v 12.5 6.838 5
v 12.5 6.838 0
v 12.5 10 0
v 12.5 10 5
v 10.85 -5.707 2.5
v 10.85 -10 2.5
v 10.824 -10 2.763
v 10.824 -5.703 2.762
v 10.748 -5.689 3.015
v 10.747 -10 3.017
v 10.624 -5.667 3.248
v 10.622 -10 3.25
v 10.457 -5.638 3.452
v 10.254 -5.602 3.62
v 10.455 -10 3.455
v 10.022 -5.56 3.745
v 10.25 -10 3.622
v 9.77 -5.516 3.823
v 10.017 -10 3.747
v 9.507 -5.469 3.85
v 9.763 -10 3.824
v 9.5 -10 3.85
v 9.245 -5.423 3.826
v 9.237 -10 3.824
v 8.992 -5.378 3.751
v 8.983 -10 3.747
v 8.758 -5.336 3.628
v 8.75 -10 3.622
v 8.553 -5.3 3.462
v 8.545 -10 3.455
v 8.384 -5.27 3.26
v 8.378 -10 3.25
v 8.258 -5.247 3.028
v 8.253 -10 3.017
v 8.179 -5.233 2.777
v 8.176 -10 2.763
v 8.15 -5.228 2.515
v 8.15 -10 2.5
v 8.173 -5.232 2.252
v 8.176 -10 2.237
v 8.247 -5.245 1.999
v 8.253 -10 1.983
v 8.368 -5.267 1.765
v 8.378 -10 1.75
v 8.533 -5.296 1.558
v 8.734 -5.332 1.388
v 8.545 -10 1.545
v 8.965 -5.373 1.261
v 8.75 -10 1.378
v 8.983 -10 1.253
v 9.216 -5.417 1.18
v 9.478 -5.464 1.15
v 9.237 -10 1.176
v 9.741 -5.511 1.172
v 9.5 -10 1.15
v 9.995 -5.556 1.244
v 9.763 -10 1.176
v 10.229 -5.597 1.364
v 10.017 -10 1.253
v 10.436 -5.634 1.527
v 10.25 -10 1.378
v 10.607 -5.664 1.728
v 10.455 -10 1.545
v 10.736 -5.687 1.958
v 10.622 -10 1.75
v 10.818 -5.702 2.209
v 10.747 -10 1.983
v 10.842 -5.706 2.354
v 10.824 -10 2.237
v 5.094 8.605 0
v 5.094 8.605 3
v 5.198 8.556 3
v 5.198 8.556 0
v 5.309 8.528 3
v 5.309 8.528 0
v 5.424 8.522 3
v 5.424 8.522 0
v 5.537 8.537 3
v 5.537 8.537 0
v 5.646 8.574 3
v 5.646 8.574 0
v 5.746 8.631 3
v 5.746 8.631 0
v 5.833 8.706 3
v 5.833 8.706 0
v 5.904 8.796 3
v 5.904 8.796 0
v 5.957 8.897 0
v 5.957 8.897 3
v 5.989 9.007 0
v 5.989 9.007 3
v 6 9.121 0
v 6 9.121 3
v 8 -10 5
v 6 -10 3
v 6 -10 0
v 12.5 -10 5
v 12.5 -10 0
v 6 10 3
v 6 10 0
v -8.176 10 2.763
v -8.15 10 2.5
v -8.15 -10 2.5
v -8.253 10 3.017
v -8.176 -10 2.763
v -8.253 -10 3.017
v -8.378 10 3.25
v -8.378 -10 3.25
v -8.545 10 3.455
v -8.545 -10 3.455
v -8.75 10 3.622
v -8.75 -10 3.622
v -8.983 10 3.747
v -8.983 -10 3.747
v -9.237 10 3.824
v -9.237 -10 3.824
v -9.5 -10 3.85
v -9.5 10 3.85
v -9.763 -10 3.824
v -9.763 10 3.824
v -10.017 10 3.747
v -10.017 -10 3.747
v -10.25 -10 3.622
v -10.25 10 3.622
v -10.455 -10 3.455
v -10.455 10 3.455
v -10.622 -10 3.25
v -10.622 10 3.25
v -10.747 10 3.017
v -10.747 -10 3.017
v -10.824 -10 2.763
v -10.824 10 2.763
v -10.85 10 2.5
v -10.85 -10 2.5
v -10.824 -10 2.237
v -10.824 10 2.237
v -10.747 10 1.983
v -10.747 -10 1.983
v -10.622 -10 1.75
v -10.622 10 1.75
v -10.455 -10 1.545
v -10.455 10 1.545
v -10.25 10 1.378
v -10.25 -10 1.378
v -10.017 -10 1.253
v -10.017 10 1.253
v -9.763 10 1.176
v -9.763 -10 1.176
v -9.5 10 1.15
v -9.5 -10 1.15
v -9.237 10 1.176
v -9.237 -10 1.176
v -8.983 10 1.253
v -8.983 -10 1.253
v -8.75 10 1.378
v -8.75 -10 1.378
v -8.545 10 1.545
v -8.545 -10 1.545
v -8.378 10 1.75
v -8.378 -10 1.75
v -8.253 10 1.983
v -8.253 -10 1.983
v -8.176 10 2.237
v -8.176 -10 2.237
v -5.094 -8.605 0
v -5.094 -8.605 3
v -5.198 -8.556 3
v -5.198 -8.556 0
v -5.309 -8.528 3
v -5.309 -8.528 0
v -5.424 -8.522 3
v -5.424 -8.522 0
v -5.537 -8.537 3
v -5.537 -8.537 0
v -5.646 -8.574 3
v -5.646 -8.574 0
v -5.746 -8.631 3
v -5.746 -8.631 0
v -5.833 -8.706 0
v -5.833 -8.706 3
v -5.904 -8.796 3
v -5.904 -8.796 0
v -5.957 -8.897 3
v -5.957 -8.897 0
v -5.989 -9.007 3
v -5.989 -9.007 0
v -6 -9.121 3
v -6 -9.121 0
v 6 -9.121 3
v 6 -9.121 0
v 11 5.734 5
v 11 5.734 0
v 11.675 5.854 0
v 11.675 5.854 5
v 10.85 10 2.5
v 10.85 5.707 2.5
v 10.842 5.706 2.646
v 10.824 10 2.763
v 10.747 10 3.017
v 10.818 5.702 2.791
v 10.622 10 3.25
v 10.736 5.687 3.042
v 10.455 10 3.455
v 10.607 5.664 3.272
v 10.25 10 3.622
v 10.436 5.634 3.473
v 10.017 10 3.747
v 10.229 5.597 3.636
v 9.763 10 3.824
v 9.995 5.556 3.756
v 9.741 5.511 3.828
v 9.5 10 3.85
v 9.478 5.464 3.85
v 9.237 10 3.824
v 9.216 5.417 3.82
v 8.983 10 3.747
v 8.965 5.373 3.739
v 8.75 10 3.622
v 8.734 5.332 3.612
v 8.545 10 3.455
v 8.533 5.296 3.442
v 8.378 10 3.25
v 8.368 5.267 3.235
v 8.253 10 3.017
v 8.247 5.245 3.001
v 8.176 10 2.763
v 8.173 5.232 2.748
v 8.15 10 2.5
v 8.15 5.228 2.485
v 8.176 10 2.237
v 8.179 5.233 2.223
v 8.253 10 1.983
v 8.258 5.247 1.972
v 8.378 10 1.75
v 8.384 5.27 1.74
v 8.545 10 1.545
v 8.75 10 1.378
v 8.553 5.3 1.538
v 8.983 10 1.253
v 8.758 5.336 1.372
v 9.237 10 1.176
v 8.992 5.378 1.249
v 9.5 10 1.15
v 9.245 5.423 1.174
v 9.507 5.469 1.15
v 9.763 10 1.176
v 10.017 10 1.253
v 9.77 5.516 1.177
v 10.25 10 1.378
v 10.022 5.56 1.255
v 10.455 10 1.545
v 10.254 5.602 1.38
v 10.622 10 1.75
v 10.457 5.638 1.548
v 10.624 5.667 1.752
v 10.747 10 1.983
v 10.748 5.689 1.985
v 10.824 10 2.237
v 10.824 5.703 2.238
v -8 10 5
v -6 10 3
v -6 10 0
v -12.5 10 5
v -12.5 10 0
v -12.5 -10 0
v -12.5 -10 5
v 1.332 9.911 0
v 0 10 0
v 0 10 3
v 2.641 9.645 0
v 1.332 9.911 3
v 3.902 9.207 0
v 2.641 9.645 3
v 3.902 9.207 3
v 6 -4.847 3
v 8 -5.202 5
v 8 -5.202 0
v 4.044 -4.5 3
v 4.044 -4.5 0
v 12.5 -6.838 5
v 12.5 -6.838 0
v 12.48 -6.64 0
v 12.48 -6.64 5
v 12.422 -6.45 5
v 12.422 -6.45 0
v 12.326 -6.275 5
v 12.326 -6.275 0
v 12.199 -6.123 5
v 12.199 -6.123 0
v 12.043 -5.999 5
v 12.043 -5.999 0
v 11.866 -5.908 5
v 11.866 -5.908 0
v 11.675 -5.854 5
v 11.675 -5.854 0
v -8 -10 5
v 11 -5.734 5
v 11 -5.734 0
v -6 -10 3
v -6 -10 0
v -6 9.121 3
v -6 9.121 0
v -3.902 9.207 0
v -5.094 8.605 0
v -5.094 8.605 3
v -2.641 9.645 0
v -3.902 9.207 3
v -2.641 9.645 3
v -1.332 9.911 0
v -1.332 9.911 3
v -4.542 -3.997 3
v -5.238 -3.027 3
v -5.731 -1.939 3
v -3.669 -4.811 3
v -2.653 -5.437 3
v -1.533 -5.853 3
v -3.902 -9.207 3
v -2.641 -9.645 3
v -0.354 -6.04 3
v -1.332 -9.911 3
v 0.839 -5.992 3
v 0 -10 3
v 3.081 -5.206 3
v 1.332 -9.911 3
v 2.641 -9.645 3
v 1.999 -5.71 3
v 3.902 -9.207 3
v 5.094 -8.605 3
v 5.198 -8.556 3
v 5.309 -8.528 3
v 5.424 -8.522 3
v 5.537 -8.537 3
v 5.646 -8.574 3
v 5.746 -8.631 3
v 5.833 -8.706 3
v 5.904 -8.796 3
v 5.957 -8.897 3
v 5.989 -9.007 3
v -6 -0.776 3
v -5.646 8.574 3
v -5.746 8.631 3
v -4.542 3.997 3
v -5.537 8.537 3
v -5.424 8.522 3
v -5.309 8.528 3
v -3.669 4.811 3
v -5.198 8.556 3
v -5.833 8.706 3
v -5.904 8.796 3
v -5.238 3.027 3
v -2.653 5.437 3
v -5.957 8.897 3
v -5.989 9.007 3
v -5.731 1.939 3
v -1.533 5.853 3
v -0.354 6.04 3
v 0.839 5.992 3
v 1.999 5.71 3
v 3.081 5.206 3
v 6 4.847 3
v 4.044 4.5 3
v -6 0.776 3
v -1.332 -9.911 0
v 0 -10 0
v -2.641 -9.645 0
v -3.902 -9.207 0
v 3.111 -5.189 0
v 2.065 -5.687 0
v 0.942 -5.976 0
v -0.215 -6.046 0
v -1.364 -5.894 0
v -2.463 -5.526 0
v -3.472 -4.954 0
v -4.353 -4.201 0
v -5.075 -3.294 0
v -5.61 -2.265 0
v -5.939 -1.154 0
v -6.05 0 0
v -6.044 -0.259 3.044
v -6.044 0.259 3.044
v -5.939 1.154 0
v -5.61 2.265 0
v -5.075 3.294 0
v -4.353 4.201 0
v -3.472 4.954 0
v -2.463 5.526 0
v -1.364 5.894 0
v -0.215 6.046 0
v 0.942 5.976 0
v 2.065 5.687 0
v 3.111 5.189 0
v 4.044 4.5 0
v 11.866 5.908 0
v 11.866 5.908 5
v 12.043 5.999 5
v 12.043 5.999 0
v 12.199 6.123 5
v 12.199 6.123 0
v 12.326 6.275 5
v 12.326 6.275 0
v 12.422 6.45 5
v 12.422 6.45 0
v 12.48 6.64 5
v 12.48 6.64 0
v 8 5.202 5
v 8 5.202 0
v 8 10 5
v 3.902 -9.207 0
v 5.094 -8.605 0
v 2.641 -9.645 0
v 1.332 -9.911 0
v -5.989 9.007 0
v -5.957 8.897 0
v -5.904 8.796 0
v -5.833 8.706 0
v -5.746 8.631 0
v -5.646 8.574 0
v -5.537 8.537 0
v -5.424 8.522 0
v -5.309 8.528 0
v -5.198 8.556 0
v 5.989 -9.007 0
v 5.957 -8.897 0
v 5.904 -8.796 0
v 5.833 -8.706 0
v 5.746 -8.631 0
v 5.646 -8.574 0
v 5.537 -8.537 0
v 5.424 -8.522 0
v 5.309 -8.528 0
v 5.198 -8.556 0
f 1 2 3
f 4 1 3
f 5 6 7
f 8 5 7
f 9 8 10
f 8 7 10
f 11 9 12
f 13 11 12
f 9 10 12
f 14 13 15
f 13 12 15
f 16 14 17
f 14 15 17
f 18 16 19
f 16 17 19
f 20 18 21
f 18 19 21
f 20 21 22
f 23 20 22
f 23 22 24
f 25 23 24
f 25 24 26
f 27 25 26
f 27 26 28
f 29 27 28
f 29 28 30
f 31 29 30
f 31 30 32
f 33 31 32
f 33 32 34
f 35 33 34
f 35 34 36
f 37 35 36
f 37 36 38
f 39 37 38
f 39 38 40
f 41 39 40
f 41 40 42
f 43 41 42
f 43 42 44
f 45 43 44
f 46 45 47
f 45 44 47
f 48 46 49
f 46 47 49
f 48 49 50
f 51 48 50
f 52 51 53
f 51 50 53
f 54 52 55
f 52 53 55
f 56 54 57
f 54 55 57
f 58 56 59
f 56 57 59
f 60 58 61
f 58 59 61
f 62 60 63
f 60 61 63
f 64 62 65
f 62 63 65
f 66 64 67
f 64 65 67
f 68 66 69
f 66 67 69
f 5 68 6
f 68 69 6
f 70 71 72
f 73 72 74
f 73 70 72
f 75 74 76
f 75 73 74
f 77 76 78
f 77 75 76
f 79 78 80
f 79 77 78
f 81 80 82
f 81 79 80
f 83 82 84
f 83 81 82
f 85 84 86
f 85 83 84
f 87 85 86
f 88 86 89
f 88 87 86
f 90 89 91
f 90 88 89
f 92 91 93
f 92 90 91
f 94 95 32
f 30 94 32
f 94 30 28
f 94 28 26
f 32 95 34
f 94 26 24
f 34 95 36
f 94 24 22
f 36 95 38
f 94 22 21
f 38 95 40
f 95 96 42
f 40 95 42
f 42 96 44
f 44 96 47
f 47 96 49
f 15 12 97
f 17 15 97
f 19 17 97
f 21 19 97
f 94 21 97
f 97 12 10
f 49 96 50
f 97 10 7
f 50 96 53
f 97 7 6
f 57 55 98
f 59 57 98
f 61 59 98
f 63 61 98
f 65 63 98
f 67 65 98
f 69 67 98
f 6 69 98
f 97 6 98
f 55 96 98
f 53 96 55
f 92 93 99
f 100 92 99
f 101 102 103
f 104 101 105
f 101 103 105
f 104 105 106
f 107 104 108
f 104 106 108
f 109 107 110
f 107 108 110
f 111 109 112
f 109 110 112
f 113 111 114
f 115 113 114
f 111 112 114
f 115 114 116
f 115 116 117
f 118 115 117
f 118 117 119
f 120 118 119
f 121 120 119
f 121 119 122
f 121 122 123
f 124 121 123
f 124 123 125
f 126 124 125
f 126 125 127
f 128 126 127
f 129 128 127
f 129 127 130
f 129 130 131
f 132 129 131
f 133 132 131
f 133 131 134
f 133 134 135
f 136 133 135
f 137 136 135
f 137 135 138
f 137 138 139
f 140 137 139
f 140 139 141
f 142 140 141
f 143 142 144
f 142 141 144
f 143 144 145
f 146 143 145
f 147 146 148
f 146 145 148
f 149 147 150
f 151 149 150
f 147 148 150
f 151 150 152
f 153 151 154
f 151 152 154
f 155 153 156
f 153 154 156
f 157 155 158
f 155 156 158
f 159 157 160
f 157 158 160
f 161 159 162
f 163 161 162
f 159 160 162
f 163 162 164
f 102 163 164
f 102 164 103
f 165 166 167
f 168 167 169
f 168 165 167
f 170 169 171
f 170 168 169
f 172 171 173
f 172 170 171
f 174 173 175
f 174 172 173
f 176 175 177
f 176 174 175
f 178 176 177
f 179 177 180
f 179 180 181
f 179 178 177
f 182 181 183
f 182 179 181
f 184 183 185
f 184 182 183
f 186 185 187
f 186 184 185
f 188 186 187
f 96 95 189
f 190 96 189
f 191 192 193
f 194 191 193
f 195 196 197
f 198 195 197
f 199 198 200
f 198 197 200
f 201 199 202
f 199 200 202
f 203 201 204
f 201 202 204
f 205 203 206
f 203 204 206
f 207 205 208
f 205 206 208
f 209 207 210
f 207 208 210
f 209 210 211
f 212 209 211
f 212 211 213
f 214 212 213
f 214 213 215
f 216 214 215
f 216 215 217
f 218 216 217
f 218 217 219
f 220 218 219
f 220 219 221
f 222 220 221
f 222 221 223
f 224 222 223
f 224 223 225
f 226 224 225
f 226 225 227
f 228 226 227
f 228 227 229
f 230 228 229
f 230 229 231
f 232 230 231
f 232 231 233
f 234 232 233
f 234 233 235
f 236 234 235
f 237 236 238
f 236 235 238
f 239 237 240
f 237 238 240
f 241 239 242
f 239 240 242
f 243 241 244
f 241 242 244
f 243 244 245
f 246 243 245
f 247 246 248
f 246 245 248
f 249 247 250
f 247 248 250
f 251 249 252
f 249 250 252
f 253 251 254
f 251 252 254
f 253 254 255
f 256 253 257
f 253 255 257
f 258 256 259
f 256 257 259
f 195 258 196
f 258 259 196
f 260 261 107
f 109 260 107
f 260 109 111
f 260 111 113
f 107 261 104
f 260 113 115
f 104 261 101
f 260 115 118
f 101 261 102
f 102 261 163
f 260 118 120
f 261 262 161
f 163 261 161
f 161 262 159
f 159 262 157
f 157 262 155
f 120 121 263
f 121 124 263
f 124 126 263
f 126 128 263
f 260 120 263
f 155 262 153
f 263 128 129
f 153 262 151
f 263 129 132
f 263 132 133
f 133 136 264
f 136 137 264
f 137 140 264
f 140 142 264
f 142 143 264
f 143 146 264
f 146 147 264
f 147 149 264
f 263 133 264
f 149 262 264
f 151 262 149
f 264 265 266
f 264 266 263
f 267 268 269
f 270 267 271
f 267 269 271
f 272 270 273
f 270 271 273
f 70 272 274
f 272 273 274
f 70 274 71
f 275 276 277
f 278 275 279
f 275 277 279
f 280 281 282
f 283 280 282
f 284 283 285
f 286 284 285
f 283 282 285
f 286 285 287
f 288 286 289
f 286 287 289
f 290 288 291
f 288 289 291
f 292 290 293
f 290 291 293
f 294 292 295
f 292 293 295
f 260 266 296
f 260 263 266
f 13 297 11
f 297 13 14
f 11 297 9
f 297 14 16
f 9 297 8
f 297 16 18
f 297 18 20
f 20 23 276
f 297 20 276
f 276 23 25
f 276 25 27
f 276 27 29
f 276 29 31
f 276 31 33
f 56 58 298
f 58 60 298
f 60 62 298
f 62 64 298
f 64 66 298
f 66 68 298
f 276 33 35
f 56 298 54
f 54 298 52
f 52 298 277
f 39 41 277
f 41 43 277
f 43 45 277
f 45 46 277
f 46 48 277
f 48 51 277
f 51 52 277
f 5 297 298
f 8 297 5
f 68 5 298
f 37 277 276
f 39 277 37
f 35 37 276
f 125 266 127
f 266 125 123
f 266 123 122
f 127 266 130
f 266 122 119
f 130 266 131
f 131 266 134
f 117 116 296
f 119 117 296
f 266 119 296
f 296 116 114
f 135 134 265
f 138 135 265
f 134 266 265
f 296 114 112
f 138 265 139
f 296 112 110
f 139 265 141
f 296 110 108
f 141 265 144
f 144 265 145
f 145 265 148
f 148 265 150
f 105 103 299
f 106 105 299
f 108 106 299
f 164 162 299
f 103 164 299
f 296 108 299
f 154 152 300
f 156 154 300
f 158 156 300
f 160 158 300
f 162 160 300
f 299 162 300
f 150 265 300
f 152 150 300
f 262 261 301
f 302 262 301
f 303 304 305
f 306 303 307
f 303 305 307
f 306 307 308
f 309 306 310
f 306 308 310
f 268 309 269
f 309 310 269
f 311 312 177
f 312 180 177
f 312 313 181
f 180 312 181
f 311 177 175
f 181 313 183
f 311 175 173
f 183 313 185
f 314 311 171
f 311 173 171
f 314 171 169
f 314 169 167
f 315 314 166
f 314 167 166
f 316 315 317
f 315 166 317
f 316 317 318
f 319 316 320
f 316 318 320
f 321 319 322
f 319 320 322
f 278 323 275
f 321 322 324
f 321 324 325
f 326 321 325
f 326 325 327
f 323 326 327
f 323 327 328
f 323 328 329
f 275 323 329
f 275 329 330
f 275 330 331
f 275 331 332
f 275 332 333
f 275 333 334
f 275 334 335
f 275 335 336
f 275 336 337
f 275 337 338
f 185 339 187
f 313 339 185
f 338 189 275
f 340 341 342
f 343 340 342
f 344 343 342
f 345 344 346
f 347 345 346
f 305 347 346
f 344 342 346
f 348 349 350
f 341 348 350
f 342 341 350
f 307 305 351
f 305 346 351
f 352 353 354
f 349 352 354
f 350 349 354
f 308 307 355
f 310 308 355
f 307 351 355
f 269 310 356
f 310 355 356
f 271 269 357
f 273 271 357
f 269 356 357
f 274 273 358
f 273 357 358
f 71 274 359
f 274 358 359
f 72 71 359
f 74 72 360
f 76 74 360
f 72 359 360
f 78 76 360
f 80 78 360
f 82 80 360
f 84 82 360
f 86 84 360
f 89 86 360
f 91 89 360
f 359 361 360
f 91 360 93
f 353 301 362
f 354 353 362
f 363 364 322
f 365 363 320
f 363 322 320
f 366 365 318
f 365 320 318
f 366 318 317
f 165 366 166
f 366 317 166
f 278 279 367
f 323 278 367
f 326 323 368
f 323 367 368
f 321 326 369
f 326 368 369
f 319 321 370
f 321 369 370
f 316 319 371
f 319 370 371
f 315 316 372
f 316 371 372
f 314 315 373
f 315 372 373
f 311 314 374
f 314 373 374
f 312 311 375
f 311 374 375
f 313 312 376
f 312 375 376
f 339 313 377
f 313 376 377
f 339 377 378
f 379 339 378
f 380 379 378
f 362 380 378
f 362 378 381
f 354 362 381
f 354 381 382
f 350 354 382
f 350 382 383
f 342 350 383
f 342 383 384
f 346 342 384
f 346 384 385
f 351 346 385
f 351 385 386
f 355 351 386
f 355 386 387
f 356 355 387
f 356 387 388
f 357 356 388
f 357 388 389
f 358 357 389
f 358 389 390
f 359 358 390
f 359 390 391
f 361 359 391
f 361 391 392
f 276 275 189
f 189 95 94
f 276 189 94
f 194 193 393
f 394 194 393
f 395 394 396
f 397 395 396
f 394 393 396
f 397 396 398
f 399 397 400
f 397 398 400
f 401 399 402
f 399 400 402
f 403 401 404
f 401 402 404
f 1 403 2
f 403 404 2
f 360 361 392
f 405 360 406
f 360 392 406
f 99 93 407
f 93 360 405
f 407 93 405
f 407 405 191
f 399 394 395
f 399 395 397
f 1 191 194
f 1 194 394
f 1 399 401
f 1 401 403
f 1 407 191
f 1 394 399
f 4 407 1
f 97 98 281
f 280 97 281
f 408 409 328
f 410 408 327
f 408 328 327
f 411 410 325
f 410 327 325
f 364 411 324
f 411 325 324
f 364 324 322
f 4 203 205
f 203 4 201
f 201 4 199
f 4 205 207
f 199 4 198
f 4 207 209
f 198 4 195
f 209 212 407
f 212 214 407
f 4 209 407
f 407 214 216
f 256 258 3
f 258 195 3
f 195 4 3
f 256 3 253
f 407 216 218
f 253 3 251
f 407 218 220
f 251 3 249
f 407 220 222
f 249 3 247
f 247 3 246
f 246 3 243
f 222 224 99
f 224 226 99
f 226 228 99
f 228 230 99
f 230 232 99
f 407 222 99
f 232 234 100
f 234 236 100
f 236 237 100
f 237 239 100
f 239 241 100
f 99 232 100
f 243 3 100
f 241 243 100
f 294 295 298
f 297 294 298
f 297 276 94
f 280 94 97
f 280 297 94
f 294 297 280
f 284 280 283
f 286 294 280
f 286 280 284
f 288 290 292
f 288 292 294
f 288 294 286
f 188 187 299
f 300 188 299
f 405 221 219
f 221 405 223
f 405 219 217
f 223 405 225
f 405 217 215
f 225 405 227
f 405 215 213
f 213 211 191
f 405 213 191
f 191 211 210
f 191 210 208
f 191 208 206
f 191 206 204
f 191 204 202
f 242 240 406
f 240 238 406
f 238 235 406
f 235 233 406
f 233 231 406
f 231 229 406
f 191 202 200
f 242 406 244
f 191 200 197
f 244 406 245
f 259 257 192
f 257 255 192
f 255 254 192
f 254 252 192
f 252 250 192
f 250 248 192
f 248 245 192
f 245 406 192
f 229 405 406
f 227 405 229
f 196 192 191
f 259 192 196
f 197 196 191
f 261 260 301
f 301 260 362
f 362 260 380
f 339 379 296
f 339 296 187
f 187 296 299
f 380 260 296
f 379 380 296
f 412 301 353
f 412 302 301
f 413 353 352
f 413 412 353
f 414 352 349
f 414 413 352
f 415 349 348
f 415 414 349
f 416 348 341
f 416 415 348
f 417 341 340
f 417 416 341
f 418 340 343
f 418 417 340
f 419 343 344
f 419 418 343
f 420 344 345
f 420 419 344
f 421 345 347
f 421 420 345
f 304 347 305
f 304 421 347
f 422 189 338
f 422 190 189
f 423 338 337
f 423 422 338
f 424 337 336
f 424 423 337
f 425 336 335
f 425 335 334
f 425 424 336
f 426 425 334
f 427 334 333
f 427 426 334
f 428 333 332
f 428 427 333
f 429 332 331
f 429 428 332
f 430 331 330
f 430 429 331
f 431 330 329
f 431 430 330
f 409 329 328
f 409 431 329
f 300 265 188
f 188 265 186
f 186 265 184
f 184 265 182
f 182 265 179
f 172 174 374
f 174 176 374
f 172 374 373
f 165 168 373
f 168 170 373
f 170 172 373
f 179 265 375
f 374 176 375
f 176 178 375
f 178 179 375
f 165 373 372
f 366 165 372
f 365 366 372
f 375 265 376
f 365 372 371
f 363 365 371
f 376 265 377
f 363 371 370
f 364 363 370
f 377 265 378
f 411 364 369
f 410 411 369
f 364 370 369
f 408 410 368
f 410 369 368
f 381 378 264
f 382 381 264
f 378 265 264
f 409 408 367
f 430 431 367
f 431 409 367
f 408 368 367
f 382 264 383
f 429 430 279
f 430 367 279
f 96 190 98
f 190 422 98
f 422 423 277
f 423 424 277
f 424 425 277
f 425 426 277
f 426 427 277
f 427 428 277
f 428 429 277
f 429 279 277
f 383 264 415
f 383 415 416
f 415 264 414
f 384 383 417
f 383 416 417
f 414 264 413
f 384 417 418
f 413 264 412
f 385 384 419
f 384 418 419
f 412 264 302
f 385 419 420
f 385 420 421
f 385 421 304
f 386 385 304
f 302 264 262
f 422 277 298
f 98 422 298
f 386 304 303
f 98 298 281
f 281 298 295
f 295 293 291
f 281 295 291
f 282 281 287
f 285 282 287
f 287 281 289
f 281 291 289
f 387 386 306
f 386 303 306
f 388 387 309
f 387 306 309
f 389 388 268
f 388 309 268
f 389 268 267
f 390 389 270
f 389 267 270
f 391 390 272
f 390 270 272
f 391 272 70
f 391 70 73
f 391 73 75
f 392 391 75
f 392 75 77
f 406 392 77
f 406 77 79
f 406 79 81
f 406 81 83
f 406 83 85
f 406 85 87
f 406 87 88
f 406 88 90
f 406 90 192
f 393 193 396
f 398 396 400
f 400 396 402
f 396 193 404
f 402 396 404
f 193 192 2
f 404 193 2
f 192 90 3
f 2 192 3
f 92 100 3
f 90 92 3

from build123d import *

# Parameters (mm, degrees)
F0_W     = 1.5
F0_H     = 20
F0_W_2   = 3
F1_DEPTH = 5
F2_R     = 1.35
F3_DEPTH = 25
F5_DEPTH = 25
F6_R     = 0.6


with BuildPart() as f1:
    # F0 (on Top) → F1 (new body)
    with BuildSketch(Plane.XY):
        with BuildLine():
            ThreePointArc((4.0438224491, -4.5), (-6.05, 0), (4.0438224491, 4.5))
            Line((4.0438224491, 4.5), (8, 5.201766997))
            Line((8, 5.201766997), (8, 10))
            Line((8, 10), (-8, 10))
            Line((-8, 10), (-8, -10))
            Line((-8, -10), (8, -10))
            Line((8, -10), (8, -5.201766997))
            Line((8, -5.201766997), (4.0438224491, -4.5))
        make_face()
        Polygon((8, 10), (8, 5.201766997), (11, 5.7339223323), (11, 10), align=None)
        with BuildLine():
            Line((11, 10), (11, 5.7339223323))
            Line((11, 5.7339223323), (11.6746585367, 5.8535967123))
            ThreePointArc((11.6746585367, 5.8535967123), (12.2663741047, 6.1958312477), (12.5, 6.8382257772))
            Line((12.5, 6.8382257772), (12.5, 10))
            Line((12.5, 10), (11, 10))
        make_face()
        with BuildLine():
            Line((11.6746585367, -5.8535967123), (11, -5.7339223323))
            Line((11, -5.7339223323), (11, -10))
            Line((11, -10), (12.5, -10))
            Line((12.5, -10), (12.5, -6.8382257772))
            ThreePointArc((12.5, -6.8382257772), (12.2663741047, -6.1958312477), (11.6746585367, -5.8535967123))
        make_face()
        Polygon((11, -5.7339223323), (8, -5.201766997), (8, -10), (11, -10), align=None)
        with Locations((-11.75, 0)):
            Rectangle(F0_W, F0_H)
        with Locations((-9.5, 0)):
            Rectangle(F0_W_2, F0_H)
    extrude(amount=F1_DEPTH)

    # F2 (on face) → F3 (cut)
    with BuildSketch(Plane.XZ.offset(10)):
        with Locations((-9.5, 2.5)):
            Circle(F2_R)
        with Locations((9.5, 2.5)):
            Circle(F2_R)
        Polygon((8, 5), (0, 5), (-8, 5), (-6, 3), (0, 3), (6, 3), align=None)
    extrude(amount=-F3_DEPTH, mode=Mode.SUBTRACT)

    # F4 (on face) → F5 (cut)
    with BuildSketch(Plane.XY.offset(3)):
        with BuildLine():
            ThreePointArc((5.97e-08, 10), (3.1622776885, 9.4868329711), (6, 8))
            Line((6, 8), (6, 10))
            Line((6, 10), (5.97e-08, 10))
        make_face()
        with BuildLine():
            ThreePointArc((-6, 8), (-3.1622776319, 9.4868329899), (5.97e-08, 10))
            Line((5.97e-08, 10), (-6, 10))
            Line((-6, 10), (-6, 8))
        make_face()
        with BuildLine():
            Line((-6, -10), (5.97e-08, -10))
            ThreePointArc((5.97e-08, -10), (-3.1622776319, -9.4868329899), (-6, -8))
            Line((-6, -8), (-6, -10))
        make_face()
        with BuildLine():
            Line((5.97e-08, -10), (6, -10))
            Line((6, -10), (6, -8))
            ThreePointArc((6, -8), (3.1622776885, -9.4868329711), (5.97e-08, -10))
        make_face()
    extrude(amount=-F5_DEPTH, mode=Mode.SUBTRACT)

    # F6
    f6_edges = [f1.edges().sort_by_distance(p)[0] for p in [
        (-6, -8, 1.5),
        (-6, 8, 1.5),
        (6, 8, 1.5),
        (6, -8, 1.5),
    ]]
    fillet(f6_edges, radius=F6_R)


solid = f1.part
